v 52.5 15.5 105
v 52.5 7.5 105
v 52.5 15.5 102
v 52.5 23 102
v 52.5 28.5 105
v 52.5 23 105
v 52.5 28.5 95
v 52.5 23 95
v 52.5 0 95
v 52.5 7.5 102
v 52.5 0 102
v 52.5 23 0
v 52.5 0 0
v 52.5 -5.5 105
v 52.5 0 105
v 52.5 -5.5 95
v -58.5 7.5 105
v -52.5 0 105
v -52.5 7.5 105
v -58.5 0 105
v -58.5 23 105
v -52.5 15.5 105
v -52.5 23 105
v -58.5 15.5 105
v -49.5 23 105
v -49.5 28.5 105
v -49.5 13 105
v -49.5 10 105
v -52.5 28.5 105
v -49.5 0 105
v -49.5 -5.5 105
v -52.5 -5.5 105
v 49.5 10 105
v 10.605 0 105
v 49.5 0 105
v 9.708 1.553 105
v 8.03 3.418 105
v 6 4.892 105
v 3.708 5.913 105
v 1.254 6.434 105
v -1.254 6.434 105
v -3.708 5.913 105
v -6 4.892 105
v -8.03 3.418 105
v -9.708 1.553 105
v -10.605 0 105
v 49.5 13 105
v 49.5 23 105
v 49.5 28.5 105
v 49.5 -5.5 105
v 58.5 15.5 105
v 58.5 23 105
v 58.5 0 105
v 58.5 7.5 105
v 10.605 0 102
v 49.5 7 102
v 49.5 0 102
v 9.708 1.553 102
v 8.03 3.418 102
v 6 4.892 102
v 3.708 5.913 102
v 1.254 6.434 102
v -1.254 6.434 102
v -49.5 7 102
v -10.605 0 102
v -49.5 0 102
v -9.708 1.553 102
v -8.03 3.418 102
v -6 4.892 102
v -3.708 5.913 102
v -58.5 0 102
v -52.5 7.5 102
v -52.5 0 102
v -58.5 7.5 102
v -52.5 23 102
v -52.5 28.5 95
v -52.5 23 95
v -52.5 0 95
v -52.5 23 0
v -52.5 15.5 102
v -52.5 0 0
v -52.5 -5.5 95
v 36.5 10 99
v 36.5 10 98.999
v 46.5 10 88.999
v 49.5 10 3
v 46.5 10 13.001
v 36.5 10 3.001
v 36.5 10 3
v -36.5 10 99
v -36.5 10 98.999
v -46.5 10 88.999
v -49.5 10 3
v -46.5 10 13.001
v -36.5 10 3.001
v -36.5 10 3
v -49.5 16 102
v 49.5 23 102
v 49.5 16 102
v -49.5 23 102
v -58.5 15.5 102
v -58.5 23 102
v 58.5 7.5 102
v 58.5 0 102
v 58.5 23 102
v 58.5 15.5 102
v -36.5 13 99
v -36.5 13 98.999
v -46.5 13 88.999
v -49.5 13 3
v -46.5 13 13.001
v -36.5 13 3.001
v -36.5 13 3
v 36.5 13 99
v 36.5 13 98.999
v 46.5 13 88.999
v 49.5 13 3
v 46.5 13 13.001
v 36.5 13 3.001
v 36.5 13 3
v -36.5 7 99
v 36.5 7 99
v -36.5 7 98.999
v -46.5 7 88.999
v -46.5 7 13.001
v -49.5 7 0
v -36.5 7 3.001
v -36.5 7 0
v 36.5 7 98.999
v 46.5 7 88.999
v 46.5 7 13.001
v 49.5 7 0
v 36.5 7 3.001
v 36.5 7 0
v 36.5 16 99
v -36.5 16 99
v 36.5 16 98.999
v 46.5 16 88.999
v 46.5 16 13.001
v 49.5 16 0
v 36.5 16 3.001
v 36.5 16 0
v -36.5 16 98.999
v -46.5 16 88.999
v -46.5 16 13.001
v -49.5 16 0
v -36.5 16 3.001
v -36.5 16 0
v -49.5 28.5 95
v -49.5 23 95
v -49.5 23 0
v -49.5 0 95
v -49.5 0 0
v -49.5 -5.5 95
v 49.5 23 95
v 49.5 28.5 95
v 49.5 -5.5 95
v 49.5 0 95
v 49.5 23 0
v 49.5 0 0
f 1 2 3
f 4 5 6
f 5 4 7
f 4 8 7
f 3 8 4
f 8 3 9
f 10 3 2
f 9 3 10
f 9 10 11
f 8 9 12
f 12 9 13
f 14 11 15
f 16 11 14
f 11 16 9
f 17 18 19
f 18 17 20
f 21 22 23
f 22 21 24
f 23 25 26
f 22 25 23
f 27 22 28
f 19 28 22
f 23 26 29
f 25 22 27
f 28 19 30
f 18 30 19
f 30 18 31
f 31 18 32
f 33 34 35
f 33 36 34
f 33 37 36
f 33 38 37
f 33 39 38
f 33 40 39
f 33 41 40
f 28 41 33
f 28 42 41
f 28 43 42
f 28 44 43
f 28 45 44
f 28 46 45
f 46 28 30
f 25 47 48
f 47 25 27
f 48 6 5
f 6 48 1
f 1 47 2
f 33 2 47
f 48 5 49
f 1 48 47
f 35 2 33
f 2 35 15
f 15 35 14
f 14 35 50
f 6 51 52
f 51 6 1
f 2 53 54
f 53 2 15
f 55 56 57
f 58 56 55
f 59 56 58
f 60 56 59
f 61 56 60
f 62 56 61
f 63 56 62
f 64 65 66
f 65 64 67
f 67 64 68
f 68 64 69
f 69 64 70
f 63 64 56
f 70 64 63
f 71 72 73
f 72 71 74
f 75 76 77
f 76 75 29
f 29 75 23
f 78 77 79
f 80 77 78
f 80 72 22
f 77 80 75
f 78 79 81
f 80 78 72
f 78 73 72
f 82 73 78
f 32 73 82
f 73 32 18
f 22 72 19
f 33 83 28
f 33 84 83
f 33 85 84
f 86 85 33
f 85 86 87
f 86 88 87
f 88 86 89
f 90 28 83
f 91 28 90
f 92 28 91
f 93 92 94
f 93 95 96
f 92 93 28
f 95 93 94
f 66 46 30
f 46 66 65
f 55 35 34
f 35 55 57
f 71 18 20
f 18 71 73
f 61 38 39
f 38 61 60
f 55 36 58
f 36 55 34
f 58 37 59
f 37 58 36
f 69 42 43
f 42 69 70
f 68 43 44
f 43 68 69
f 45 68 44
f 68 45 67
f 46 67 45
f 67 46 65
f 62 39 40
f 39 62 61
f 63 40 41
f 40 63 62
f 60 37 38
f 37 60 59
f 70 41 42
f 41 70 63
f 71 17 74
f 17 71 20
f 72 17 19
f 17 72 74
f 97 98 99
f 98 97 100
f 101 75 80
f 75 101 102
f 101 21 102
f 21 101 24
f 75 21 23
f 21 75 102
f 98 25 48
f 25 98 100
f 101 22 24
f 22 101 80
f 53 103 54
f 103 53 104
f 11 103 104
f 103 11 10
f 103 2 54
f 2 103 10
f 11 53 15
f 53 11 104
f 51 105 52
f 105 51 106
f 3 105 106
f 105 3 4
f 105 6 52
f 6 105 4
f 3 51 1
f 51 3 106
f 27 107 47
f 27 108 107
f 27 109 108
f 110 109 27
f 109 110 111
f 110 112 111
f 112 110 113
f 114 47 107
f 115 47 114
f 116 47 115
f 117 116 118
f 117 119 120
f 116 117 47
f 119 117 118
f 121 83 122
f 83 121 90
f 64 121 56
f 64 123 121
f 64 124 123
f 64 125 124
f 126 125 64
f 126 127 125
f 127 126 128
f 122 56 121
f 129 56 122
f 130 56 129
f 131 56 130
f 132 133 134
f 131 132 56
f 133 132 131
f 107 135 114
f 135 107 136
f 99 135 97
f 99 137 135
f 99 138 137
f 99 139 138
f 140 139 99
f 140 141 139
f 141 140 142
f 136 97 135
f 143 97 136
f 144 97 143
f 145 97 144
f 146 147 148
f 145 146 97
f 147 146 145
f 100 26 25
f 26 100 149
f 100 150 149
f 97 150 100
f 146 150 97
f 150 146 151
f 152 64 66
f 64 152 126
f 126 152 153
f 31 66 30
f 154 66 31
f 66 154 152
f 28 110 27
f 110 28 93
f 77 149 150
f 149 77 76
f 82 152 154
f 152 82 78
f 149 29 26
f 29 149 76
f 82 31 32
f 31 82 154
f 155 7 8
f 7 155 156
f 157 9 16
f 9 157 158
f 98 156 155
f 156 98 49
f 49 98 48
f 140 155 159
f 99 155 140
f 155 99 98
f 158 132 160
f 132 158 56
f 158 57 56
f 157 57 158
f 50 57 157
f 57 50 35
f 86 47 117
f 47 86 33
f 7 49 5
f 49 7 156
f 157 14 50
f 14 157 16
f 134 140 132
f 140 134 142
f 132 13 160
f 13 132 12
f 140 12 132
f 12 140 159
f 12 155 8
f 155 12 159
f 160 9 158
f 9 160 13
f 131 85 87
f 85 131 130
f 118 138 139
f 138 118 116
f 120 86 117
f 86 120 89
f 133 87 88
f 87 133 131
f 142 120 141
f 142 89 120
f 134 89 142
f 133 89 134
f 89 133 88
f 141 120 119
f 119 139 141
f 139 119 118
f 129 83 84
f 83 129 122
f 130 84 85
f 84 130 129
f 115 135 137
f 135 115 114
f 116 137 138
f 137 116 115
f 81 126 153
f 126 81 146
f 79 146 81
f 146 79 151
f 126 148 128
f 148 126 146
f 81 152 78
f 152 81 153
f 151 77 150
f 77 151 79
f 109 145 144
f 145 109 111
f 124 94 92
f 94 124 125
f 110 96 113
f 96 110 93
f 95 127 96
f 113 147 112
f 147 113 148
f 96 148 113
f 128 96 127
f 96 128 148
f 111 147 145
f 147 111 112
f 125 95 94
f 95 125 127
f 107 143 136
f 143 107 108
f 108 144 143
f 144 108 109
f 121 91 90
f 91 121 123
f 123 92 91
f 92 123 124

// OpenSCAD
bee_space = 7;

/*
// 3 make a 3/4d frame
frame_height = 177;
frame_width = (465 / 3) - bee_space * 2;
frame_spacing = 33;
frame_bar_width = 23;

bar_thickness = 3;
tab_length = bee_space;
tab_notch = 8;
spacing_tab_width = 10;
corner_size = 10;
groove_depth = 3;
groove_width = 3;
*/

// Apidea compatible?
frame_height = 105;
frame_width = 105;
frame_spacing = 34;
frame_bar_width = 23;

bar_thickness = 3;
tab_length = 6;
tab_notch = 8;
spacing_tab_width = 10;
corner_size = 10;
groove_depth = 3;
groove_width = 3;

groove1_y = frame_bar_width/2-bar_thickness-groove_width/2;
groove2_y = frame_bar_width/2+groove_width/2;

module grooved_tab() {
    translate([-tab_length, 0, 0])
        cube([tab_length, frame_bar_width/2-tab_notch/2, bar_thickness]);
    translate([-tab_length, frame_bar_width/2+tab_notch/2, 0])
        cube([tab_length, frame_bar_width/2-tab_notch/2, bar_thickness]);
}

module top_bar() {
    difference() {
        translate([-frame_width/2, 0, frame_height - bar_thickness])
            cube([frame_width, frame_bar_width/2-groove_width/2, bar_thickness]);
        translate([0, -(frame_spacing-frame_bar_width)/2, 0])
            cylinder(r=12, h=1e3);
    }
    
    translate([-frame_width/2, frame_bar_width/2+groove_width/2, frame_height - bar_thickness])
        cube([frame_width, frame_bar_width/2-groove_width/2, bar_thickness]);
    
    // Top Groove
    translate([-frame_width/2, groove1_y, frame_height - bar_thickness - groove_depth])
        cube([frame_width, bar_thickness, groove_depth]);
    
    translate([-frame_width/2, groove2_y, frame_height - bar_thickness - groove_depth])
        cube([frame_width, bar_thickness, groove_depth]);
    
    
    // Tabs
    translate([-frame_width/2, 0, frame_height-bar_thickness])
        grooved_tab();
    translate([frame_width/2+tab_length, 0, frame_height-bar_thickness])
        grooved_tab();
    
    translate([-frame_width/2, -(frame_spacing-frame_bar_width)/2, frame_height - spacing_tab_width])
        cube([bar_thickness, frame_spacing, spacing_tab_width]);
    
    translate([frame_width/2-bar_thickness, -(frame_spacing-frame_bar_width)/2, frame_height - spacing_tab_width])
        cube([bar_thickness, frame_spacing, spacing_tab_width]);
}

module corner() {
    hull() {
        translate([-groove_depth, 0, bar_thickness])
            cube([bar_thickness, bar_thickness, 1e-3]);
        translate([-groove_depth, 0, corner_size+bar_thickness])
            cube([bar_thickness, bar_thickness, 1e-3]);
        translate([-groove_depth-corner_size, 0, bar_thickness])
            cube([bar_thickness, bar_thickness, 1e-3]);
    }
}

module side_bar() {
    x_offset = frame_width/2-bar_thickness;
    translate([x_offset, 0, 0])
        cube([bar_thickness, frame_bar_width, frame_height]);
    
    translate([x_offset-groove_depth, groove1_y, 0])
        cube([groove_depth, bar_thickness, frame_height]);
    
    translate([x_offset-groove_depth, groove2_y, 0])
        cube([groove_depth, bar_thickness, frame_height]);
    
    translate([x_offset, groove1_y, 0])
        corner();
    translate([x_offset, groove2_y, 0])
        corner();
    translate([x_offset, groove1_y, frame_height-groove_depth])
        mirror([0, 0, 1])
            corner();
    translate([x_offset, groove2_y, frame_height-groove_depth])
        mirror([0, 0, 1])
            corner();
    
    // Corner bottom
    translate([x_offset-groove_depth-corner_size, groove1_y, 0])
        cube([groove_depth+corner_size, groove2_y-groove1_y+bar_thickness, bar_thickness]);
}

top_bar();
side_bar();
translate([0, frame_bar_width, 0])
    rotate([0, 0, 180])
        side_bar();
